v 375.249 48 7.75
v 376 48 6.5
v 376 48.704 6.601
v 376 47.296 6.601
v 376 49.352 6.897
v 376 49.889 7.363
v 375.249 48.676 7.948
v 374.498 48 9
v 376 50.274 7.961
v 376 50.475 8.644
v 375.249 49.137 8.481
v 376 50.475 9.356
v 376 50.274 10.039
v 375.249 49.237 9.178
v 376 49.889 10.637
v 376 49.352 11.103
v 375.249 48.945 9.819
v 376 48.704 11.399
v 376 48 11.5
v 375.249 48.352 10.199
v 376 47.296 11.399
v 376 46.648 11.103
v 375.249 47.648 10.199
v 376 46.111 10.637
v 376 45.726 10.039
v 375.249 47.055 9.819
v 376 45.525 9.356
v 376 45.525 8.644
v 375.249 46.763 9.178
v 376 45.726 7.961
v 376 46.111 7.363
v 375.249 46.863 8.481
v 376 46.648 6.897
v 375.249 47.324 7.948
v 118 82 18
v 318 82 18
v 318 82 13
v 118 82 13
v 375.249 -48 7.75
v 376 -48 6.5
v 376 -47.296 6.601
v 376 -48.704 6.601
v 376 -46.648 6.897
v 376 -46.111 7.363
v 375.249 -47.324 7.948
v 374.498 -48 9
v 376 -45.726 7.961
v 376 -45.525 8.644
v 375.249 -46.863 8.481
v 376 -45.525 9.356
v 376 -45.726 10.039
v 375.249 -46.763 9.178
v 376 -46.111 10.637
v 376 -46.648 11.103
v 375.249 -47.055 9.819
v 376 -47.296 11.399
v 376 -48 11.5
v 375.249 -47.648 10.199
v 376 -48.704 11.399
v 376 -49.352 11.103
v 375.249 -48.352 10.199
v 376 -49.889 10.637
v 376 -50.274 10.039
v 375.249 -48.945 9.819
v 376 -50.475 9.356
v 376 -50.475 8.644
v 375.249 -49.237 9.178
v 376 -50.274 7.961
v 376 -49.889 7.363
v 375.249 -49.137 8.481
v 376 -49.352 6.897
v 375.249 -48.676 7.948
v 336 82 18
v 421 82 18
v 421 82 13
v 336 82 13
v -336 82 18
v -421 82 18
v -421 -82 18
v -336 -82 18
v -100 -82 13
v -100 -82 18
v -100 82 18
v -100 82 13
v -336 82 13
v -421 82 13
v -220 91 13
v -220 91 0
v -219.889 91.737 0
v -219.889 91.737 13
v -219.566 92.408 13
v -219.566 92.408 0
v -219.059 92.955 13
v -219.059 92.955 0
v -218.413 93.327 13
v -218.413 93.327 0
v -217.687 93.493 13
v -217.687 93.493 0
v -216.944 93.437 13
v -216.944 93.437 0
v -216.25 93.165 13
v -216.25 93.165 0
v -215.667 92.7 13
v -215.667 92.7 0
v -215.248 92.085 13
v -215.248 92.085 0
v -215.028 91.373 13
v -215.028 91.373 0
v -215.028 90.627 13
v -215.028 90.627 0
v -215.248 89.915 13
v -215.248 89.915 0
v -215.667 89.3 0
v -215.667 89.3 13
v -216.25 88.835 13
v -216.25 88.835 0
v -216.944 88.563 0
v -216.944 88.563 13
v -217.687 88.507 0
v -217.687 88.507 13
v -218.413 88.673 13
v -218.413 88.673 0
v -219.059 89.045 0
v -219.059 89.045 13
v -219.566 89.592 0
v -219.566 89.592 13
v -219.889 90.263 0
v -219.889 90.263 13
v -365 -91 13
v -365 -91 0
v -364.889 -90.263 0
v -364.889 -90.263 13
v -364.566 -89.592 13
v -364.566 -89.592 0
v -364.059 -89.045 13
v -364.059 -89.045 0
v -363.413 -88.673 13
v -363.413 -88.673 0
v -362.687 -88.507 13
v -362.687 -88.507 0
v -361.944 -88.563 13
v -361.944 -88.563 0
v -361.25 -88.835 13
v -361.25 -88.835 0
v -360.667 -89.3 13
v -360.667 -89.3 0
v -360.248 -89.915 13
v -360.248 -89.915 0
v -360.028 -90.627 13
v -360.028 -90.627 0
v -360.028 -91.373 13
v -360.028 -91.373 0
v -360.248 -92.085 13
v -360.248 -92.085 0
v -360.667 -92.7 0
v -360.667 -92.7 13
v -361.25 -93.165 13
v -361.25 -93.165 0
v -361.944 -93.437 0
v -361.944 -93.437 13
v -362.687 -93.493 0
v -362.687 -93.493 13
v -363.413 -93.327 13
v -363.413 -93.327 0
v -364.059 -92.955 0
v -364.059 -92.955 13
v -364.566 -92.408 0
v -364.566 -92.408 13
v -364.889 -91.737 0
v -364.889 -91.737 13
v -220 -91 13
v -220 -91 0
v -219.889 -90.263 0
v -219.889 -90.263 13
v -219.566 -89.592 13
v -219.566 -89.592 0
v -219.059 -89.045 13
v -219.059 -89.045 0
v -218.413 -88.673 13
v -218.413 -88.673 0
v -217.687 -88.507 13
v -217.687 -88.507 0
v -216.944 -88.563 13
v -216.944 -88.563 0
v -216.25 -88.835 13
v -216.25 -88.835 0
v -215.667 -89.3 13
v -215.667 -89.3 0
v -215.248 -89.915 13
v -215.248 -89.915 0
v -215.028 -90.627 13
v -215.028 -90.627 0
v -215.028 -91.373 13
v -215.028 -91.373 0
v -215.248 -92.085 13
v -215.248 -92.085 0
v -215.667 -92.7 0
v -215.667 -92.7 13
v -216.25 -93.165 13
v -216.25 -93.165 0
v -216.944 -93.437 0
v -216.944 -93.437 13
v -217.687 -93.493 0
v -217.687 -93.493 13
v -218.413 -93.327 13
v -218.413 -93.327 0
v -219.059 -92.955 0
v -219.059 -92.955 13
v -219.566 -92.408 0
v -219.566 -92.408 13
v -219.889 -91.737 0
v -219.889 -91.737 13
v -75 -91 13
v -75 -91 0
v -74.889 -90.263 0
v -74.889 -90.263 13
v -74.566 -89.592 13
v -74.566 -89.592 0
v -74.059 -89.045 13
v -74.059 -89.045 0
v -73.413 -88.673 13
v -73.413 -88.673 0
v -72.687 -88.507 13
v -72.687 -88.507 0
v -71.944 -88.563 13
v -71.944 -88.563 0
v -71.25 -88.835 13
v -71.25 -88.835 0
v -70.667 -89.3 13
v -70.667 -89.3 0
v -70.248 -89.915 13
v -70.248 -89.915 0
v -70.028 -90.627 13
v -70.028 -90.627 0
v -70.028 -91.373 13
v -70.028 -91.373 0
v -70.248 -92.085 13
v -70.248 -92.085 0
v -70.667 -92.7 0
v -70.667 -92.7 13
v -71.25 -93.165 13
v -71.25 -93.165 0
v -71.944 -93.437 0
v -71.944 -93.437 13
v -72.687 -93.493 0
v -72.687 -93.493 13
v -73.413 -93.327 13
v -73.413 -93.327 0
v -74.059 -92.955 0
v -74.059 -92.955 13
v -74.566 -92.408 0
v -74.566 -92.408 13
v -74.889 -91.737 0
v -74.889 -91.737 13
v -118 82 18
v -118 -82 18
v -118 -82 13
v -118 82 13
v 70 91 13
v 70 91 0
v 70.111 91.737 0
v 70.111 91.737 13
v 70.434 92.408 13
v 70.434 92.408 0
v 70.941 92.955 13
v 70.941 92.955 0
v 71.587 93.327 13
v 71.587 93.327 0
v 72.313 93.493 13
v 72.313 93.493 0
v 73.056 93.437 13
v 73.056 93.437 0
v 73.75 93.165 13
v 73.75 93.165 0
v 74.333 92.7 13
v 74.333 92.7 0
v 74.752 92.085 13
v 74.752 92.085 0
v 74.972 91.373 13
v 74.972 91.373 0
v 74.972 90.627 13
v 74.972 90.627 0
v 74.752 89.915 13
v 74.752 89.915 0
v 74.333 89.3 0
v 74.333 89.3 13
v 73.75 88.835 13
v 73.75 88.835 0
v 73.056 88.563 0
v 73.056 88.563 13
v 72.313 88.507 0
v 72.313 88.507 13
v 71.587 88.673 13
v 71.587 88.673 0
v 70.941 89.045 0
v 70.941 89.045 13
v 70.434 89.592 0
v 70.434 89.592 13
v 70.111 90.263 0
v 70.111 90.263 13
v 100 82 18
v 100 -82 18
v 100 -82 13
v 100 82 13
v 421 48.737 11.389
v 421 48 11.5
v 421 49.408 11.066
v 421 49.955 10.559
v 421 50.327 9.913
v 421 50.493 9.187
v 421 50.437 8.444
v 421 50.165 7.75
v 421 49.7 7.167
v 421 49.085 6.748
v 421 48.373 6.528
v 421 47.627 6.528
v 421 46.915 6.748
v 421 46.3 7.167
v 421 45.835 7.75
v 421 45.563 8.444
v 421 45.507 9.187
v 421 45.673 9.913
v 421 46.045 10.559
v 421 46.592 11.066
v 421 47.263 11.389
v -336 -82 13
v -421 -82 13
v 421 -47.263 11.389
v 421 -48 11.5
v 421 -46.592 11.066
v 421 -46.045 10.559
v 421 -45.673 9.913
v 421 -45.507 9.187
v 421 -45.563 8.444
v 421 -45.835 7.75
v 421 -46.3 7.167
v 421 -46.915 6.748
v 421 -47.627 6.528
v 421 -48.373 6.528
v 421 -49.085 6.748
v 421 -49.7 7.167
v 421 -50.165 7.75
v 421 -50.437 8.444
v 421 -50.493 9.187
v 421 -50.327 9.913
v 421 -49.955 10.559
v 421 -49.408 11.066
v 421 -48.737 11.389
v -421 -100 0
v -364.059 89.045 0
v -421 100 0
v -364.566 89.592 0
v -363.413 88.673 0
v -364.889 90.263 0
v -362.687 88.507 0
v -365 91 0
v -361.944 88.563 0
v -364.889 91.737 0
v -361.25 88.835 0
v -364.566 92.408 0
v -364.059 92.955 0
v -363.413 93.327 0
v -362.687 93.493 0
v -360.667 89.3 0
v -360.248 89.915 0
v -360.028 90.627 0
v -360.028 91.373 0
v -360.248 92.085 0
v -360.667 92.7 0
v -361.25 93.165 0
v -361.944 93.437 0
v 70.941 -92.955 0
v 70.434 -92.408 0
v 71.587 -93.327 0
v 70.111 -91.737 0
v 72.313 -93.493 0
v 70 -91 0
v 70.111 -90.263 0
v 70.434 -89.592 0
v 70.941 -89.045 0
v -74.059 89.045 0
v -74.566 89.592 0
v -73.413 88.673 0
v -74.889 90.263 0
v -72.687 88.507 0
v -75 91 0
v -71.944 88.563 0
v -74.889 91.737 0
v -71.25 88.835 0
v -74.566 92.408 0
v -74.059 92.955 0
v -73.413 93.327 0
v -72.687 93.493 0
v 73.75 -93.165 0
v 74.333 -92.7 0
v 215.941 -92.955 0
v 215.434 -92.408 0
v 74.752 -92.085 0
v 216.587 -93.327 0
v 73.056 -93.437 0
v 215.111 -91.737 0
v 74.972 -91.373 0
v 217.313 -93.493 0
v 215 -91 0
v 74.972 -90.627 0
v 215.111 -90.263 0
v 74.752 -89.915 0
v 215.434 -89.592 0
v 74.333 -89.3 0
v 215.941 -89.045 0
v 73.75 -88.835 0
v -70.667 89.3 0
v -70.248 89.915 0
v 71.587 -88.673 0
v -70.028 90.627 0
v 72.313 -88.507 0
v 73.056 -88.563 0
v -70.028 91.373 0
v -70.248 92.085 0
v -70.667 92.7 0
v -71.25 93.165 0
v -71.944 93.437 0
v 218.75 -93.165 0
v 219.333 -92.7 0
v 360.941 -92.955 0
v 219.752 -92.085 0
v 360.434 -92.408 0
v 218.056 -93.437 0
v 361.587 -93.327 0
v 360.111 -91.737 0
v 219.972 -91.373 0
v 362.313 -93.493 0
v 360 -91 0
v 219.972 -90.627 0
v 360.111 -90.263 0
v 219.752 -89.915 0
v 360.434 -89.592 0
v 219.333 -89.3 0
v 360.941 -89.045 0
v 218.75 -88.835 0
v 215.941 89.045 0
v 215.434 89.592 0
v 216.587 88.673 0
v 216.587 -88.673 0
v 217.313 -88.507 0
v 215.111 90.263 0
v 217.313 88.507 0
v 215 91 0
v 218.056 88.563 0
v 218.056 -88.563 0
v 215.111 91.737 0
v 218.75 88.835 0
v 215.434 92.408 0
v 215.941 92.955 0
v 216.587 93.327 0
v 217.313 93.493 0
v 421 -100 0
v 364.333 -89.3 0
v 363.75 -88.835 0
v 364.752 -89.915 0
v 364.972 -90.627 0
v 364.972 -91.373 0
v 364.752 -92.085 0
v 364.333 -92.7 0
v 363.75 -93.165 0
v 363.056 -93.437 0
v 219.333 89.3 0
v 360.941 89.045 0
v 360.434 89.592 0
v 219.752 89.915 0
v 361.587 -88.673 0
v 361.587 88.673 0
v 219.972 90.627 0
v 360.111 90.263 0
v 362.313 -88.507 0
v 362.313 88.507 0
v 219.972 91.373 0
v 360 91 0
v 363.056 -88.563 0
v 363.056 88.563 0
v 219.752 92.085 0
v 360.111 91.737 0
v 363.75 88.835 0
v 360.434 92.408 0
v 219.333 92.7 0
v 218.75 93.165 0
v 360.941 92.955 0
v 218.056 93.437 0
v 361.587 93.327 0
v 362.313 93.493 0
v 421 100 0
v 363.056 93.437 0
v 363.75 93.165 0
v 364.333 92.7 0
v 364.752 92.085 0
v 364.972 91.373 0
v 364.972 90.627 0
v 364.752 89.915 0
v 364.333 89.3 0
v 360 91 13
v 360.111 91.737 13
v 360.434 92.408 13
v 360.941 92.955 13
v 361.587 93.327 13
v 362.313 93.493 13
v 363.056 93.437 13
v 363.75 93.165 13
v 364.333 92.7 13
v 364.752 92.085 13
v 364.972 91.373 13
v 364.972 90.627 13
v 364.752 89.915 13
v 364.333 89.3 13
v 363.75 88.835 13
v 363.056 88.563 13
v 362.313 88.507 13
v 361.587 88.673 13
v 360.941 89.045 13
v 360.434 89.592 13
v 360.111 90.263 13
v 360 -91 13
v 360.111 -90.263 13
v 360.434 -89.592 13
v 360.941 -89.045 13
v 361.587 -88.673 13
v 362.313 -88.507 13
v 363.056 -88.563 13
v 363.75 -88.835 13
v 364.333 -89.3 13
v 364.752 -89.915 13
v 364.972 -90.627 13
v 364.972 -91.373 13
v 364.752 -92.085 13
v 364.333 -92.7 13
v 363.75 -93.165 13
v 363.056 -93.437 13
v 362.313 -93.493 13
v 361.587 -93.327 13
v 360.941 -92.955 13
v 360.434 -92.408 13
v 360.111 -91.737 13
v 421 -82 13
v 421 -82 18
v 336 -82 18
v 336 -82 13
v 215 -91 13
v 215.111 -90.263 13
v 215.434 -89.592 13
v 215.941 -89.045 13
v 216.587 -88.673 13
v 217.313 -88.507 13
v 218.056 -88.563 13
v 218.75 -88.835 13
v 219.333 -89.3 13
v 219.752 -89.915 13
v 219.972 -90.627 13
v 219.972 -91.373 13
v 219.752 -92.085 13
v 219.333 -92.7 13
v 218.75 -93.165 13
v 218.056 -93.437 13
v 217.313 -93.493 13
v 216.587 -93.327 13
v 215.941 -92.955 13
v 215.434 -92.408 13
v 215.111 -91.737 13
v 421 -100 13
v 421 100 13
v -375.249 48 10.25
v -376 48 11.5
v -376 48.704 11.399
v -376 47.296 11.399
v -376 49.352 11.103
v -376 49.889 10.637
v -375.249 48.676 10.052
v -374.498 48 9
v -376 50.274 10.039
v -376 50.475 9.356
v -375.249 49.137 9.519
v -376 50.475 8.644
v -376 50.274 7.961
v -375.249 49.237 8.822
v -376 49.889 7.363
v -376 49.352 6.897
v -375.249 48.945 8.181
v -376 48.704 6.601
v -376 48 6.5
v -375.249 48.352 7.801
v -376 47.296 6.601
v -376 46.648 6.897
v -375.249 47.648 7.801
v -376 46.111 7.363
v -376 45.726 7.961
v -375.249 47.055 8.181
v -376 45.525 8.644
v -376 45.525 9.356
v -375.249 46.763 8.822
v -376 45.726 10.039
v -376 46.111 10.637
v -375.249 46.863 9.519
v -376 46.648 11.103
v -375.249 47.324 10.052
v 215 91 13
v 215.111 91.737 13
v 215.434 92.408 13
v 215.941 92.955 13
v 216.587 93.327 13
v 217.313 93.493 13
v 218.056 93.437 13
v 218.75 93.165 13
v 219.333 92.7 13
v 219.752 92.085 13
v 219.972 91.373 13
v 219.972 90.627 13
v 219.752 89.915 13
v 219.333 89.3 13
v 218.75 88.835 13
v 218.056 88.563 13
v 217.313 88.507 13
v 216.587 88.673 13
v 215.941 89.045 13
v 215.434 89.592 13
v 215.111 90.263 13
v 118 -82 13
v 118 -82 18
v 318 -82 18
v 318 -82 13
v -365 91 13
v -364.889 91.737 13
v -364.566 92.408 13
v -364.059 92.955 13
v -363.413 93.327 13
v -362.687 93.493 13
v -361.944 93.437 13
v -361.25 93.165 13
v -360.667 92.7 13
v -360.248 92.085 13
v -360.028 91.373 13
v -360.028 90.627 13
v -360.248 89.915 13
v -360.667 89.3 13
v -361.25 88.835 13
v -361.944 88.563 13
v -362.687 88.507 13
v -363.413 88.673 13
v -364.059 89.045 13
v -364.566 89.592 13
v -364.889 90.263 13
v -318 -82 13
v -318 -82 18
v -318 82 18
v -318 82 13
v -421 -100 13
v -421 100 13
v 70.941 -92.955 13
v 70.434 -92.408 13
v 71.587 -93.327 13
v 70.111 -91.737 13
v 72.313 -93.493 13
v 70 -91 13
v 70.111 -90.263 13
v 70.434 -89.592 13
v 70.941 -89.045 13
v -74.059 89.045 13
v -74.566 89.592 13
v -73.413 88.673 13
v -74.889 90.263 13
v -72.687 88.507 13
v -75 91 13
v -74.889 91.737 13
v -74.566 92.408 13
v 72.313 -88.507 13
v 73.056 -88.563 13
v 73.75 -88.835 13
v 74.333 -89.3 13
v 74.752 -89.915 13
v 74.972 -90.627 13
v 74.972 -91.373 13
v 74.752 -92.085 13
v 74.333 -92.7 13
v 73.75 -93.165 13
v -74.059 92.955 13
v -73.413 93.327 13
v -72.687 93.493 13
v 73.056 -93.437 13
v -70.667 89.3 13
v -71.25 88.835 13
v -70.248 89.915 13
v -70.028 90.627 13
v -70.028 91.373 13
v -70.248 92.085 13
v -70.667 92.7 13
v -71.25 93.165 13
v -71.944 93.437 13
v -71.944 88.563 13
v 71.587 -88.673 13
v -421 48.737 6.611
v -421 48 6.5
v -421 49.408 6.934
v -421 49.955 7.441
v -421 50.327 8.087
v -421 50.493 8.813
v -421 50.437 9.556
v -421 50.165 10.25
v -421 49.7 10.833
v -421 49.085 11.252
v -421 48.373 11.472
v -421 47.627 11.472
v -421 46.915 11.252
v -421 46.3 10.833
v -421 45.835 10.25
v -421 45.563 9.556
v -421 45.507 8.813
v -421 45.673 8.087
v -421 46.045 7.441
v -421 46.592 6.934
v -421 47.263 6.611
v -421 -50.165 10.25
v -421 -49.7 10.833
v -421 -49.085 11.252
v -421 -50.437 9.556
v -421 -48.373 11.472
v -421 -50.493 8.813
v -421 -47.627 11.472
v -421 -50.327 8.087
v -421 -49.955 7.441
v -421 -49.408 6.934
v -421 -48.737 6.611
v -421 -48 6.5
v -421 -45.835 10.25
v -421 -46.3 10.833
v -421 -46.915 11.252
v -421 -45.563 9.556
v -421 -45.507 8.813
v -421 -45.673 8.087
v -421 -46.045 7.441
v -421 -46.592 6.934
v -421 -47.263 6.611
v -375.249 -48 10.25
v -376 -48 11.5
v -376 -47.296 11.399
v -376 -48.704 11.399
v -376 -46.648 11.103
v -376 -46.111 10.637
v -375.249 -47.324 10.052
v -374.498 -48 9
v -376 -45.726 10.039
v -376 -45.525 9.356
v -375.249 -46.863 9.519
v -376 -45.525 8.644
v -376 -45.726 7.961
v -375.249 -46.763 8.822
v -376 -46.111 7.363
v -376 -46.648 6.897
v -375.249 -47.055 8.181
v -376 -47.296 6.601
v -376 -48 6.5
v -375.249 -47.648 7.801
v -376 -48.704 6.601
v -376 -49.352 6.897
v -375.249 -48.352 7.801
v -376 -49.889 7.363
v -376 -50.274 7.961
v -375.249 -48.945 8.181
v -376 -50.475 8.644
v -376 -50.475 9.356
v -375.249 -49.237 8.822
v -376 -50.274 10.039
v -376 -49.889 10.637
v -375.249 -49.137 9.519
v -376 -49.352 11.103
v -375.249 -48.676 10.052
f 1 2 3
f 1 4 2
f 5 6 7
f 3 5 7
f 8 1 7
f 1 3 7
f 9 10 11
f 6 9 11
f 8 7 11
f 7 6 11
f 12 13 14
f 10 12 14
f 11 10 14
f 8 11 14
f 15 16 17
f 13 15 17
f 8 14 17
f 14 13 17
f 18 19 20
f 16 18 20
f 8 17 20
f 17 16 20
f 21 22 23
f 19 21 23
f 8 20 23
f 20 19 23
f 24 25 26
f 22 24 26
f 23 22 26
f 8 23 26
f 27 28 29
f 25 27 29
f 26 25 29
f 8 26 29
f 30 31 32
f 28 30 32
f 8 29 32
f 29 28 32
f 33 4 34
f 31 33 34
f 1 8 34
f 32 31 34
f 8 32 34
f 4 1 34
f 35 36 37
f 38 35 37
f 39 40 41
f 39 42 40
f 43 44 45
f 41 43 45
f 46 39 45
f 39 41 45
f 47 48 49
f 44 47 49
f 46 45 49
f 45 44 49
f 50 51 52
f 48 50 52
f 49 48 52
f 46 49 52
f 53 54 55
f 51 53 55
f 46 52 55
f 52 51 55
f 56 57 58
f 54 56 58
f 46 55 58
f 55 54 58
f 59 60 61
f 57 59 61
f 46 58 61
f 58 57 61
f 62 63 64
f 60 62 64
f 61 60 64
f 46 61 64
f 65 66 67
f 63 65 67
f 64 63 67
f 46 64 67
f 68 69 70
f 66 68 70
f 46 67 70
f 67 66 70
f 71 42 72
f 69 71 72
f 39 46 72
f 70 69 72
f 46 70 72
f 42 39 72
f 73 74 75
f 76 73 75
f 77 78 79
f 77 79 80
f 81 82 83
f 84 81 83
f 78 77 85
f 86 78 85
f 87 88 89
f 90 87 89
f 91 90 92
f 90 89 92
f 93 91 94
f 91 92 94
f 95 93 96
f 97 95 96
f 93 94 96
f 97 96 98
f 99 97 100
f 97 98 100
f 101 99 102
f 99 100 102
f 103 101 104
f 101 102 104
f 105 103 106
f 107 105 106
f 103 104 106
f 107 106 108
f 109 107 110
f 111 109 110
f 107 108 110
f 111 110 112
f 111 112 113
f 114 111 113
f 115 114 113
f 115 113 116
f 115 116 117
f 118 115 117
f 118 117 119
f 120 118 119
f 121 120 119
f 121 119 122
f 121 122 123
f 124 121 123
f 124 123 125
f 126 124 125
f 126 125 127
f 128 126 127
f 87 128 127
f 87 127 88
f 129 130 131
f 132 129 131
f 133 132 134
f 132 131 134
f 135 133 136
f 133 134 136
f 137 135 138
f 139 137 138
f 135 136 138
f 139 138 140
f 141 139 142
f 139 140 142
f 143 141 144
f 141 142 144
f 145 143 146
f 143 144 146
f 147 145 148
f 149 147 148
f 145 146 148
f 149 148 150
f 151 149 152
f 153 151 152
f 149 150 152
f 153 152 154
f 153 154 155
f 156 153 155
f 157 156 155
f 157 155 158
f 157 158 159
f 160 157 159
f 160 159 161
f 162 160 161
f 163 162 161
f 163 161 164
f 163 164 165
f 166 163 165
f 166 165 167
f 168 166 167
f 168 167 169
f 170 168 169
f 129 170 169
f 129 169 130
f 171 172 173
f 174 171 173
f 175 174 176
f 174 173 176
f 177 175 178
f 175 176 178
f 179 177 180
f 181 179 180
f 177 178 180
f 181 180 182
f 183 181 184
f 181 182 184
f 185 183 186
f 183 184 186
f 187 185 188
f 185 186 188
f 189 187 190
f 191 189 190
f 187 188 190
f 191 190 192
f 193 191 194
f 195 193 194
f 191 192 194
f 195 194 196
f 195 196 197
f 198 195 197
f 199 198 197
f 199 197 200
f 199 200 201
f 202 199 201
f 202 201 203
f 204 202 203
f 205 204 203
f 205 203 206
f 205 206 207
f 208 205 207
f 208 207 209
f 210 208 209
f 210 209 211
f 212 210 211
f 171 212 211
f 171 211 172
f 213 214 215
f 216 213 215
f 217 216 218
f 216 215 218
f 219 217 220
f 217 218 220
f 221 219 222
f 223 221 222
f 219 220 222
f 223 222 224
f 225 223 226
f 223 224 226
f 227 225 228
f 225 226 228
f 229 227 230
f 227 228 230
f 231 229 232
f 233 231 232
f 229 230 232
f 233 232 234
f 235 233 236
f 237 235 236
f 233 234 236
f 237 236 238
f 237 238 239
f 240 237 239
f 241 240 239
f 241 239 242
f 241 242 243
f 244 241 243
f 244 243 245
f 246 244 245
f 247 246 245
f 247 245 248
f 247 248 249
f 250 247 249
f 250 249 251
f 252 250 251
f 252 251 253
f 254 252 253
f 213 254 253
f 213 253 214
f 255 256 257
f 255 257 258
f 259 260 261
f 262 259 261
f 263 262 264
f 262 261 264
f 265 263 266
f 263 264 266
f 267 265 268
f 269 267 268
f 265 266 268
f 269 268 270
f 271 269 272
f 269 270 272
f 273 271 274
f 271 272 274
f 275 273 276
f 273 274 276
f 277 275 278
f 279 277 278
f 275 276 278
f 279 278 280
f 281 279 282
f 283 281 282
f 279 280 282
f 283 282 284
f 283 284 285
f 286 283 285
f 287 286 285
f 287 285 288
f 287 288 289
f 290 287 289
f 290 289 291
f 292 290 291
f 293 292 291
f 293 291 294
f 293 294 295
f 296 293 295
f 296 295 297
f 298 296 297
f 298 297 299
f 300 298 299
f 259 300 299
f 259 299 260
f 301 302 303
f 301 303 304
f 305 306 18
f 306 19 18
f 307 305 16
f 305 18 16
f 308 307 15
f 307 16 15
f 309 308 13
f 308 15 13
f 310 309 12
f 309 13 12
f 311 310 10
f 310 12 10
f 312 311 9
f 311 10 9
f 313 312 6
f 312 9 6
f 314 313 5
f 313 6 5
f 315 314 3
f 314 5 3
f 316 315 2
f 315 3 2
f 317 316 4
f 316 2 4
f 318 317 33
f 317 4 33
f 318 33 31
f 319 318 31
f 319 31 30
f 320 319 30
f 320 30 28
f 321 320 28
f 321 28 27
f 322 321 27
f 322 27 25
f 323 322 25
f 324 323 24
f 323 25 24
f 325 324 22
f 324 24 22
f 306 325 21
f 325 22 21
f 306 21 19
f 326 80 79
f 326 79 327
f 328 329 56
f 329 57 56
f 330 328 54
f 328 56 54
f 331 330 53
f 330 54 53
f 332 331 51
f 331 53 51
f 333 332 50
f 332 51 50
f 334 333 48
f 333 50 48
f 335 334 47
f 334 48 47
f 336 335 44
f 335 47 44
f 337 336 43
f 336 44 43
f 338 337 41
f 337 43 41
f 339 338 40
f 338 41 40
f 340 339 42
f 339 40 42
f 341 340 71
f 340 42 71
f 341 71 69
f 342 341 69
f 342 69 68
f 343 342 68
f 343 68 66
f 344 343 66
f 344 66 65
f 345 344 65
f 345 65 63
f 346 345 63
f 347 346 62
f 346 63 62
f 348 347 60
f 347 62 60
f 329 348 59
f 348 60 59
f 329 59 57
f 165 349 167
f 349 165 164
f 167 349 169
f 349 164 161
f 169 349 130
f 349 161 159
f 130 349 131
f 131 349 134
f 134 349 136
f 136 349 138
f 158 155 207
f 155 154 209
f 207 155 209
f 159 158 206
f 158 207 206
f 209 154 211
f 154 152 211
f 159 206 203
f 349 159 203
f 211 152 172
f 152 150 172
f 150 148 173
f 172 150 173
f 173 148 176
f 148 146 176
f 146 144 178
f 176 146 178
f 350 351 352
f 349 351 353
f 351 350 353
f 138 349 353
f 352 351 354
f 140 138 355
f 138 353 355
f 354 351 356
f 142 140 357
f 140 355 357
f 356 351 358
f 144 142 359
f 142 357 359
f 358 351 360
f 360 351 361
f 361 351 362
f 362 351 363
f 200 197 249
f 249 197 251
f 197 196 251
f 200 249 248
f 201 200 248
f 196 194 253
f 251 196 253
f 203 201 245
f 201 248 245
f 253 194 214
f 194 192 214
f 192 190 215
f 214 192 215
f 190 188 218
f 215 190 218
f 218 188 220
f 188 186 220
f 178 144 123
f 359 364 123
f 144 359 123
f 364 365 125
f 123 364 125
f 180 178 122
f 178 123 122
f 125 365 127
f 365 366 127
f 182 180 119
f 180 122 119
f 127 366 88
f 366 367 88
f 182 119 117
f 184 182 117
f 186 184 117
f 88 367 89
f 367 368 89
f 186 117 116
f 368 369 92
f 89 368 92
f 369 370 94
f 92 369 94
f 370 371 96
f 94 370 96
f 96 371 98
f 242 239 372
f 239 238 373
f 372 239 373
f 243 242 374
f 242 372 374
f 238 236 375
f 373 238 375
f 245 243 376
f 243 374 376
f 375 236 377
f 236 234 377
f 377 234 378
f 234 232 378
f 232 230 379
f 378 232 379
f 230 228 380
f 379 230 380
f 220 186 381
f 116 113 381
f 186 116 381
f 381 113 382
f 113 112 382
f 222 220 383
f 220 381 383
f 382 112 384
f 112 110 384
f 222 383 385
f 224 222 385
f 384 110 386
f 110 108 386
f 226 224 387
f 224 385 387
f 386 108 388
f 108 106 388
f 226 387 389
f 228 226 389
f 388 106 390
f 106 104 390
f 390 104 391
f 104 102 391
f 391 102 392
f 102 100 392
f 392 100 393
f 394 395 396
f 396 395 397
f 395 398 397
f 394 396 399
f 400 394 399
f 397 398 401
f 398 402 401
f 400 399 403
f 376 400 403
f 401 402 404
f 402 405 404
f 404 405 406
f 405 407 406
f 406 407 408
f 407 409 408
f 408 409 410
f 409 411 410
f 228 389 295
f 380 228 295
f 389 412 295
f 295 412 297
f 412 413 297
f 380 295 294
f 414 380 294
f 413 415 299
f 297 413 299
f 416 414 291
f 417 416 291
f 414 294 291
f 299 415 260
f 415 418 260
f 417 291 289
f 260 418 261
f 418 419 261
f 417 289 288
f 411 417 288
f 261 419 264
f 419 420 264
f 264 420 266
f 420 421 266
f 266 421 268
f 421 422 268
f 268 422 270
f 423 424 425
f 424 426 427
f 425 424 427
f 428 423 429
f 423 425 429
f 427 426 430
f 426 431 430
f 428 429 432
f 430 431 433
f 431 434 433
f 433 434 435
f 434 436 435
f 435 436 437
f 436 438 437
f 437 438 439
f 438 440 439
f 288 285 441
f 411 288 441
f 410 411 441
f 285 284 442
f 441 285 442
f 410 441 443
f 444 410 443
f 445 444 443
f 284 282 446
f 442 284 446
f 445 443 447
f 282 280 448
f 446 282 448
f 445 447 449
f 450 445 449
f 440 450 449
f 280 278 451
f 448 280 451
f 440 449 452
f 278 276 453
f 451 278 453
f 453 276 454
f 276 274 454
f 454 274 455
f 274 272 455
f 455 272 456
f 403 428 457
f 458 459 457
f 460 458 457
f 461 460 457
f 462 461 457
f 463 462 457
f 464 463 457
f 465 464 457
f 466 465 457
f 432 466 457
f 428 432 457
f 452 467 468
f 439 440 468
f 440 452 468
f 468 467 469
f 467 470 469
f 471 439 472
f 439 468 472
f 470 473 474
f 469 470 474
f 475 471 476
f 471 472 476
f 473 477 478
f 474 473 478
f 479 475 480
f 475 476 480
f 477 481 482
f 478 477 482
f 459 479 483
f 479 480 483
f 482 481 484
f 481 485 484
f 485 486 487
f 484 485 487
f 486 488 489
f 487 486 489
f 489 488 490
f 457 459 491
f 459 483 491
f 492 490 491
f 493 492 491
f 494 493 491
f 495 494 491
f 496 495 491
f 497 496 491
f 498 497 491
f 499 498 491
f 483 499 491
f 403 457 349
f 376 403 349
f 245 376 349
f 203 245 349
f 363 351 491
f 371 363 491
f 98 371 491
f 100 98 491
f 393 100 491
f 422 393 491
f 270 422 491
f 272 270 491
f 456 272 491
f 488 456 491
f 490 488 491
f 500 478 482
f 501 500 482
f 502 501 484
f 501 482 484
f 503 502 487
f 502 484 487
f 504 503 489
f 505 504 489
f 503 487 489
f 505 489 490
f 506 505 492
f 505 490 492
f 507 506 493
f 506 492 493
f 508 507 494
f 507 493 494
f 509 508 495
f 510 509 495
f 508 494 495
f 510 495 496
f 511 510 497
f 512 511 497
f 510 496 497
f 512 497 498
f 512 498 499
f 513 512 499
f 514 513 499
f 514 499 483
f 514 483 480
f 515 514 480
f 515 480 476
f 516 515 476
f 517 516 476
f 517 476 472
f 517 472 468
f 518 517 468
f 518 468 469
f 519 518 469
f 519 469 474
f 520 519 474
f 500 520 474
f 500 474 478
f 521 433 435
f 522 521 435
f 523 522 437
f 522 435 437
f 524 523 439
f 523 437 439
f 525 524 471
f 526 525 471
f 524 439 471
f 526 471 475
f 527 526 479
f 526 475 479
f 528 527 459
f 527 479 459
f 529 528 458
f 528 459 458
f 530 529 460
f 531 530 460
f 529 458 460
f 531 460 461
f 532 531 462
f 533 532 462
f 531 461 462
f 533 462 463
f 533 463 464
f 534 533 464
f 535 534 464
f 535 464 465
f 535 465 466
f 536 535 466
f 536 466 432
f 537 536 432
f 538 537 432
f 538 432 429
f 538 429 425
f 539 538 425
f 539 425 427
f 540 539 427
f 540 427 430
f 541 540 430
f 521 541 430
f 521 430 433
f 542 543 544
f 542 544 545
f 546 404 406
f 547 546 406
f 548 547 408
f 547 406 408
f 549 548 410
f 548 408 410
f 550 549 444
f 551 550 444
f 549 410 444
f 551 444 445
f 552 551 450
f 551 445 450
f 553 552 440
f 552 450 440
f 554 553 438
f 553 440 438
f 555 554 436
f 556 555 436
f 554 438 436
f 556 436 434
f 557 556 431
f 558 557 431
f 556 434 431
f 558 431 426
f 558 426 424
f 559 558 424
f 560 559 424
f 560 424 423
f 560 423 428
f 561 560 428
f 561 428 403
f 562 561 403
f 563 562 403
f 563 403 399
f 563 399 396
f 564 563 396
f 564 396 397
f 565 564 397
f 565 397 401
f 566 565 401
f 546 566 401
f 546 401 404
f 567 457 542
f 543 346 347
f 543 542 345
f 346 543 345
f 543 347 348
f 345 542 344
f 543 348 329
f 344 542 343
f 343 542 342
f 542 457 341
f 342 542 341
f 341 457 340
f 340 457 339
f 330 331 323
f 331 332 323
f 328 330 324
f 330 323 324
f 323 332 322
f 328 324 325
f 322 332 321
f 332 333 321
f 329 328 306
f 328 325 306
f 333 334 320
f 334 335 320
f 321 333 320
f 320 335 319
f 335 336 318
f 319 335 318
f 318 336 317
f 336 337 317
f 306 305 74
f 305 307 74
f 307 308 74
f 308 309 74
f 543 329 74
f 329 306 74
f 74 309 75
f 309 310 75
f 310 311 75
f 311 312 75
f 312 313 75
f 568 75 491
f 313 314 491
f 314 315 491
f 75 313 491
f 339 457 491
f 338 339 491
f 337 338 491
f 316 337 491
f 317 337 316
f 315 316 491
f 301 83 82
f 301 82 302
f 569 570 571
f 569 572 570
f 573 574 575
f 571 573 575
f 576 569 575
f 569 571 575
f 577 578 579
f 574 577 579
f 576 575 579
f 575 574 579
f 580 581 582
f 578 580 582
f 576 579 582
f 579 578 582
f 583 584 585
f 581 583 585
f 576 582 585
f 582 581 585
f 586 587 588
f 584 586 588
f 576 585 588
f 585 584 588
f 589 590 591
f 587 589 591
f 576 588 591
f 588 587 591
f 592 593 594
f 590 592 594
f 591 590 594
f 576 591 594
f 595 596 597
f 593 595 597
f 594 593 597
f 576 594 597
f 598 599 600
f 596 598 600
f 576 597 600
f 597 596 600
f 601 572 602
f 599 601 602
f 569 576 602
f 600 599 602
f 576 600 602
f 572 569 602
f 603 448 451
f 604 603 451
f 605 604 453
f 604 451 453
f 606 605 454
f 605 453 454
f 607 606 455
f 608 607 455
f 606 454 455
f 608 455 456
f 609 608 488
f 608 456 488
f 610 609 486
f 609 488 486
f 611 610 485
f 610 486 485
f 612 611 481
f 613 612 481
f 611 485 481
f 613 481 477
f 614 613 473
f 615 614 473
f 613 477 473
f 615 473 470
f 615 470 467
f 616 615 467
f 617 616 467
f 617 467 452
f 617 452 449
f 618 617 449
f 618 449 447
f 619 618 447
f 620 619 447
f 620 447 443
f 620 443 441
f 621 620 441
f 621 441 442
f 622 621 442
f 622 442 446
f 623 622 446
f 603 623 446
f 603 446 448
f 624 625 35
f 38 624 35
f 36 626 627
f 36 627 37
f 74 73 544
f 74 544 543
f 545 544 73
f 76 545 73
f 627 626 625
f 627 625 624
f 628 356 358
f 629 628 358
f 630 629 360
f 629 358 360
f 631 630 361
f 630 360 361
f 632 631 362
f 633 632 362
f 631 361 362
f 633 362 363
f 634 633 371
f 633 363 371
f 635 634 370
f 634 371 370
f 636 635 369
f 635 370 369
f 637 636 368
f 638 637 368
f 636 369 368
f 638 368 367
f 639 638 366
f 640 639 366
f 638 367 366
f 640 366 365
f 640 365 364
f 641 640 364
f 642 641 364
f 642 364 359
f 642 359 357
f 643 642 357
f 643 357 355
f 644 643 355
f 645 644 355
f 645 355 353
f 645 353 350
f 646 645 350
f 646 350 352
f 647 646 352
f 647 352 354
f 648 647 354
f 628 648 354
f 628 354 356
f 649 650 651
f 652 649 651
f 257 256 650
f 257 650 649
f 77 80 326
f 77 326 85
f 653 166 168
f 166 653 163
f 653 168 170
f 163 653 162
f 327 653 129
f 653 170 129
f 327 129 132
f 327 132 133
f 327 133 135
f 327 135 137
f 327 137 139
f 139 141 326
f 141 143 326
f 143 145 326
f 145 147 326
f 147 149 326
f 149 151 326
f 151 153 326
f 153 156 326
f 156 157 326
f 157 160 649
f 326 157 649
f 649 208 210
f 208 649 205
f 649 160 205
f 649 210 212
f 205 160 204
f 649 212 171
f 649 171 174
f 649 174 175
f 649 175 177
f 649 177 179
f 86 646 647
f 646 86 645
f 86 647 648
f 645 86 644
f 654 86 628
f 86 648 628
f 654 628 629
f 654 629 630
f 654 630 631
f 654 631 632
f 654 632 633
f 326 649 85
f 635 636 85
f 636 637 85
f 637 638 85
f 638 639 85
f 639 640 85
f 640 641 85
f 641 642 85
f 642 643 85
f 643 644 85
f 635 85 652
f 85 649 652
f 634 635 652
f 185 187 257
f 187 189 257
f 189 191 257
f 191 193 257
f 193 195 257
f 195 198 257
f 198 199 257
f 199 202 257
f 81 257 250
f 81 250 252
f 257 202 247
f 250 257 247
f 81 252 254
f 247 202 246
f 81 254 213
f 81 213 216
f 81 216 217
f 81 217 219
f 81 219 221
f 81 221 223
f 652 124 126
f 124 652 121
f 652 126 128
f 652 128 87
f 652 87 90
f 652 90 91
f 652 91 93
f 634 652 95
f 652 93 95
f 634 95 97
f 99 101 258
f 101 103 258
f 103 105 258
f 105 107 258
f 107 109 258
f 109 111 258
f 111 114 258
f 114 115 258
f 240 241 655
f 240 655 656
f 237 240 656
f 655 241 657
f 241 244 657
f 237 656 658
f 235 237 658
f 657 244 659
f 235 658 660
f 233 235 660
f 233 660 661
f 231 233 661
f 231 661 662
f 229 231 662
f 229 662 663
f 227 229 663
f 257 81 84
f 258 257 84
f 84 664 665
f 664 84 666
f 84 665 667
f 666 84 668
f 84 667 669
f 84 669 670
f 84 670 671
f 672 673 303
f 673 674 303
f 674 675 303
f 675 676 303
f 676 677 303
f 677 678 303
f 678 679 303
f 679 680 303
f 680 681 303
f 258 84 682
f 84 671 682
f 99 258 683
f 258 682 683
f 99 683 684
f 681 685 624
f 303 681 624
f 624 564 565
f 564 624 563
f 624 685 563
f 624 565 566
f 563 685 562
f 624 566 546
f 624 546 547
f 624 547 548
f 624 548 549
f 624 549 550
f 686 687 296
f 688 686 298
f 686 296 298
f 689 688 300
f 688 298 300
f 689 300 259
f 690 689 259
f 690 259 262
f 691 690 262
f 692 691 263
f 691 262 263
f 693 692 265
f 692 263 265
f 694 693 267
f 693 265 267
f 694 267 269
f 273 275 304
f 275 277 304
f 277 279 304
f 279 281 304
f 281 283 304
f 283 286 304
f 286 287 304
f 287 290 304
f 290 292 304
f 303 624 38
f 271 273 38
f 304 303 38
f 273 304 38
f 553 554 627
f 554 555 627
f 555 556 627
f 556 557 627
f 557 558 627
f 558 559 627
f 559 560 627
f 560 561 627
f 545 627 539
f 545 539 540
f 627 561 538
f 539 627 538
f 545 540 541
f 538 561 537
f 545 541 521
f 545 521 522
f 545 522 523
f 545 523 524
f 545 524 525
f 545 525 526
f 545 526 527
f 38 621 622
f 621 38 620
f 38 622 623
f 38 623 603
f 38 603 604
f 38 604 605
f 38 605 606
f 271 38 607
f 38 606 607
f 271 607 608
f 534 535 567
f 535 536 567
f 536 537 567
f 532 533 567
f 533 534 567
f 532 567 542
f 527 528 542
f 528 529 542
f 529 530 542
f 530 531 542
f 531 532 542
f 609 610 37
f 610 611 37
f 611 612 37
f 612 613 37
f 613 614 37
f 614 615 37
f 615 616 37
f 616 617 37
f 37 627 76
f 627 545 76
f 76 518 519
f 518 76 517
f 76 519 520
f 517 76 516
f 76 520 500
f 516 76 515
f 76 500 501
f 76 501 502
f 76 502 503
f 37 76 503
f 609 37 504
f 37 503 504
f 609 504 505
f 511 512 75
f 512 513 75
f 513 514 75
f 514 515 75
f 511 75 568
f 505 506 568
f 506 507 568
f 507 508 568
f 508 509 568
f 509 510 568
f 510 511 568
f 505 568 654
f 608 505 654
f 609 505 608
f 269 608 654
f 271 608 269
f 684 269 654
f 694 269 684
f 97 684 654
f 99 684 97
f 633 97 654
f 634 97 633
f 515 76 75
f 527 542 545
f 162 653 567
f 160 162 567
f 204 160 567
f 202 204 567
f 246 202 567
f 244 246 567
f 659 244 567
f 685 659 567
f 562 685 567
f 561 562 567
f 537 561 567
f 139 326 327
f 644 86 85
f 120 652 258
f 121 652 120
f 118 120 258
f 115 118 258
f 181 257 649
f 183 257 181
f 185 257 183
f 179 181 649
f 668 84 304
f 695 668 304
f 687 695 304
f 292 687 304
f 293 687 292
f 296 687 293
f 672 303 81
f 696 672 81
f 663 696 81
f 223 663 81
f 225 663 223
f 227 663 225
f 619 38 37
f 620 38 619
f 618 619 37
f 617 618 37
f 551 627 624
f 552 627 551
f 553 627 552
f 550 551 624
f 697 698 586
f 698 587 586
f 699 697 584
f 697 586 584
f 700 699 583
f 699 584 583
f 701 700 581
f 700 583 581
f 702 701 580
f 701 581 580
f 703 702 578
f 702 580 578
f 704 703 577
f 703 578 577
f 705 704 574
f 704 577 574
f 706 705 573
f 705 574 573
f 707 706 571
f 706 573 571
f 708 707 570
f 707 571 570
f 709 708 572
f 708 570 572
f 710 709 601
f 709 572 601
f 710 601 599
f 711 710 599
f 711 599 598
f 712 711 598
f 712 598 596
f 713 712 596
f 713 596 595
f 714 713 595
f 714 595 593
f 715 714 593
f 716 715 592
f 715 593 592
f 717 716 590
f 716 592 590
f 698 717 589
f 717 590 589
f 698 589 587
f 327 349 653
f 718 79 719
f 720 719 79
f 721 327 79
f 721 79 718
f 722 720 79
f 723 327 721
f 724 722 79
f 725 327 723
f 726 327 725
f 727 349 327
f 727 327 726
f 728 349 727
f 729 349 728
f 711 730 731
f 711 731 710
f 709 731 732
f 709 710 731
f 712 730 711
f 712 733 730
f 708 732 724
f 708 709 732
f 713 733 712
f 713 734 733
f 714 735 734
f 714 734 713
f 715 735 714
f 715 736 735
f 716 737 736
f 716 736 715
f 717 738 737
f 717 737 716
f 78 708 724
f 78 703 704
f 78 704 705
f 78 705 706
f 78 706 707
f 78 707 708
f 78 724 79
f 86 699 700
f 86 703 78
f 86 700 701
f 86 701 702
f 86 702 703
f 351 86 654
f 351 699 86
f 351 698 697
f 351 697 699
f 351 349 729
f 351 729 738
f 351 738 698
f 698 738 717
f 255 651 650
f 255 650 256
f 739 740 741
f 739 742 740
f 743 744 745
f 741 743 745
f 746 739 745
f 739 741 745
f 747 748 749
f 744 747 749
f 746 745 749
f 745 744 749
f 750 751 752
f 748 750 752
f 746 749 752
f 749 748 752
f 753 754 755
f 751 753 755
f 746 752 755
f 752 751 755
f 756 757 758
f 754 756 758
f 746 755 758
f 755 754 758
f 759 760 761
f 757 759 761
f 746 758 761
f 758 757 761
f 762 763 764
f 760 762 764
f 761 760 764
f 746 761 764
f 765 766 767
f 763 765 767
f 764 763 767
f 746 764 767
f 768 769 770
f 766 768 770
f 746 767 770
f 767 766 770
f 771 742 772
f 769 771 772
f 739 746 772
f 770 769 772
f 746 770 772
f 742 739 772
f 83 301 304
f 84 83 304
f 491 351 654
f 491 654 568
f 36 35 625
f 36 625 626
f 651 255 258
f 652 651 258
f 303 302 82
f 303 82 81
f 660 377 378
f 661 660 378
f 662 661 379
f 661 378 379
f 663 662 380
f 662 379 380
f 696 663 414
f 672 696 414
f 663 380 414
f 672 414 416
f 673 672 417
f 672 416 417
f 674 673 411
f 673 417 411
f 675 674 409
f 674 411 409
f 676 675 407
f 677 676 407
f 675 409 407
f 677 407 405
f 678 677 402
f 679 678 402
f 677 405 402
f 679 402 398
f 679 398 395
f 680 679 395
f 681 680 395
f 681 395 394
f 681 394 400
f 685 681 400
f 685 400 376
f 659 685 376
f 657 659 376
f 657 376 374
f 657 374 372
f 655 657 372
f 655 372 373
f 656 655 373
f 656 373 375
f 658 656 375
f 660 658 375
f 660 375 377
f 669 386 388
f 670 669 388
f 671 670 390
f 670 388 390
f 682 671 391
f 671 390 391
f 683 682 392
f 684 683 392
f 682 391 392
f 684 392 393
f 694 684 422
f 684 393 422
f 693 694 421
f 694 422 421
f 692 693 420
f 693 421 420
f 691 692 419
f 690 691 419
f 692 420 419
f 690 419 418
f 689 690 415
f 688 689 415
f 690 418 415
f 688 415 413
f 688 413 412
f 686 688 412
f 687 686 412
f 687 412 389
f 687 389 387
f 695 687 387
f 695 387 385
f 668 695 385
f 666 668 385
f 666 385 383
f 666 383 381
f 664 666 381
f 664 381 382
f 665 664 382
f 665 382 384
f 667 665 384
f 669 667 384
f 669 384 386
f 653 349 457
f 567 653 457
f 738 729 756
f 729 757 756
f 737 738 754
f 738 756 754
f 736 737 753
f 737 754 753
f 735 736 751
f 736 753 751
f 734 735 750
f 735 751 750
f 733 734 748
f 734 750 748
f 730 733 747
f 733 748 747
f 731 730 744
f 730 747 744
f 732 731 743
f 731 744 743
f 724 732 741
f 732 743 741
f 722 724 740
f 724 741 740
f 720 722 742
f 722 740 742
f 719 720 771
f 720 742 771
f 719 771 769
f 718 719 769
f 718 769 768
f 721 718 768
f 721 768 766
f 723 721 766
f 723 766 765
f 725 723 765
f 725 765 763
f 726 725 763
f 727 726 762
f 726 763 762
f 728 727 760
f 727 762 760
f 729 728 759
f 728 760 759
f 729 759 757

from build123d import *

# Parameters (mm, degrees)
SKETCH1_W                    = 842
SKETCH1_H                    = 200
BOSS_EXTRUDE1_DEPTH          = 18
SKETCH2_W                    = 5
SKETCH2_H                    = 18
CUT_EXTRUDE1_DEPTH           = 849.108483627
SKETCH3_W                    = 18
SKETCH3_H                    = 294.880521595
CUT_EXTRUDE2_DEPTH           = 5
F_5_0_5_DIAMETER_HOLE1_D     = 5
F_5_0_5_DIAMETER_HOLE2_D     = 5
F_5_0_5_DIAMETER_HOLE2_DEPTH = 45
F_5_0_5_DIAMETER_HOLE2_TIP   = 1.502151548
F_5_0_5_DIAMETER_HOLE3_D     = 5
F_5_0_5_DIAMETER_HOLE3_DEPTH = 45
F_5_0_5_DIAMETER_HOLE3_TIP   = 1.502151548


with BuildPart() as part:
    # Sketch1 → Boss-Extrude1 (new body)
    with BuildSketch(Plane.XY):
        Rectangle(SKETCH1_W, SKETCH1_H)
    extrude(amount=BOSS_EXTRUDE1_DEPTH)

    # Sketch2 → Cut-Extrude1 (cut, through all)
    with BuildSketch(Plane(origin=(421, 0, 0), x_dir=(0, 0, -1), z_dir=(1, 0, 0))):
        with Locations((-15.5, 91)):
            Rectangle(SKETCH2_W, SKETCH2_H)
        with Locations((-15.5, -91)):
            Rectangle(SKETCH2_W, SKETCH2_H)
    extrude(amount=-CUT_EXTRUDE1_DEPTH, mode=Mode.SUBTRACT)

    # Sketch3 → Cut-Extrude2 (cut)
    with BuildSketch(Plane.XY.offset(18)):
        with Locations((-327, -12.793720482)):
            Rectangle(SKETCH3_W, SKETCH3_H)
        with Locations((-109, -12.793720482)):
            Rectangle(SKETCH3_W, SKETCH3_H)
        with Locations((109, -12.793720482)):
            Rectangle(SKETCH3_W, SKETCH3_H)
        with Locations((327, -12.793720482)):
            Rectangle(SKETCH3_W, SKETCH3_H)
    extrude(amount=-CUT_EXTRUDE2_DEPTH, mode=Mode.SUBTRACT)

    # Ø5.0 (5) Diameter Hole1 (through all)
    with Locations(Plane.XY.offset(13)):
        with Locations((-362.5, 91), (-217.5, 91), (-72.5, 91), (72.5, 91), (217.5, 91), (362.5, 91), (-362.5, -91), (217.5, -91), (362.5, -91), (-217.5, -91), (-72.5, -91), (72.5, -91)):
            Hole(F_5_0_5_DIAMETER_HOLE1_D / 2)

    # Ø5.0 (5) Diameter Hole2
    with Locations(Plane(origin=(421, 0, 0), x_dir=(0, 0, -1), z_dir=(1, 0, 0))):
        with Locations((-9, 48), (-9, -48)):
            Hole(F_5_0_5_DIAMETER_HOLE2_D / 2, depth=F_5_0_5_DIAMETER_HOLE2_DEPTH)
            with Locations((0, 0, -(F_5_0_5_DIAMETER_HOLE2_DEPTH + F_5_0_5_DIAMETER_HOLE2_TIP / 2))):  # 118° drill point
                Cone(0, F_5_0_5_DIAMETER_HOLE2_D / 2, F_5_0_5_DIAMETER_HOLE2_TIP, mode=Mode.SUBTRACT)

    # Ø5.0 (5) Diameter Hole3
    with Locations(Plane.ZY.offset(421)):
        with Locations((9, 48), (9, -48)):
            Hole(F_5_0_5_DIAMETER_HOLE3_D / 2, depth=F_5_0_5_DIAMETER_HOLE3_DEPTH)
            with Locations((0, 0, -(F_5_0_5_DIAMETER_HOLE3_DEPTH + F_5_0_5_DIAMETER_HOLE3_TIP / 2))):  # 118° drill point
                Cone(0, F_5_0_5_DIAMETER_HOLE3_D / 2, F_5_0_5_DIAMETER_HOLE3_TIP, mode=Mode.SUBTRACT)


solid = part.part
